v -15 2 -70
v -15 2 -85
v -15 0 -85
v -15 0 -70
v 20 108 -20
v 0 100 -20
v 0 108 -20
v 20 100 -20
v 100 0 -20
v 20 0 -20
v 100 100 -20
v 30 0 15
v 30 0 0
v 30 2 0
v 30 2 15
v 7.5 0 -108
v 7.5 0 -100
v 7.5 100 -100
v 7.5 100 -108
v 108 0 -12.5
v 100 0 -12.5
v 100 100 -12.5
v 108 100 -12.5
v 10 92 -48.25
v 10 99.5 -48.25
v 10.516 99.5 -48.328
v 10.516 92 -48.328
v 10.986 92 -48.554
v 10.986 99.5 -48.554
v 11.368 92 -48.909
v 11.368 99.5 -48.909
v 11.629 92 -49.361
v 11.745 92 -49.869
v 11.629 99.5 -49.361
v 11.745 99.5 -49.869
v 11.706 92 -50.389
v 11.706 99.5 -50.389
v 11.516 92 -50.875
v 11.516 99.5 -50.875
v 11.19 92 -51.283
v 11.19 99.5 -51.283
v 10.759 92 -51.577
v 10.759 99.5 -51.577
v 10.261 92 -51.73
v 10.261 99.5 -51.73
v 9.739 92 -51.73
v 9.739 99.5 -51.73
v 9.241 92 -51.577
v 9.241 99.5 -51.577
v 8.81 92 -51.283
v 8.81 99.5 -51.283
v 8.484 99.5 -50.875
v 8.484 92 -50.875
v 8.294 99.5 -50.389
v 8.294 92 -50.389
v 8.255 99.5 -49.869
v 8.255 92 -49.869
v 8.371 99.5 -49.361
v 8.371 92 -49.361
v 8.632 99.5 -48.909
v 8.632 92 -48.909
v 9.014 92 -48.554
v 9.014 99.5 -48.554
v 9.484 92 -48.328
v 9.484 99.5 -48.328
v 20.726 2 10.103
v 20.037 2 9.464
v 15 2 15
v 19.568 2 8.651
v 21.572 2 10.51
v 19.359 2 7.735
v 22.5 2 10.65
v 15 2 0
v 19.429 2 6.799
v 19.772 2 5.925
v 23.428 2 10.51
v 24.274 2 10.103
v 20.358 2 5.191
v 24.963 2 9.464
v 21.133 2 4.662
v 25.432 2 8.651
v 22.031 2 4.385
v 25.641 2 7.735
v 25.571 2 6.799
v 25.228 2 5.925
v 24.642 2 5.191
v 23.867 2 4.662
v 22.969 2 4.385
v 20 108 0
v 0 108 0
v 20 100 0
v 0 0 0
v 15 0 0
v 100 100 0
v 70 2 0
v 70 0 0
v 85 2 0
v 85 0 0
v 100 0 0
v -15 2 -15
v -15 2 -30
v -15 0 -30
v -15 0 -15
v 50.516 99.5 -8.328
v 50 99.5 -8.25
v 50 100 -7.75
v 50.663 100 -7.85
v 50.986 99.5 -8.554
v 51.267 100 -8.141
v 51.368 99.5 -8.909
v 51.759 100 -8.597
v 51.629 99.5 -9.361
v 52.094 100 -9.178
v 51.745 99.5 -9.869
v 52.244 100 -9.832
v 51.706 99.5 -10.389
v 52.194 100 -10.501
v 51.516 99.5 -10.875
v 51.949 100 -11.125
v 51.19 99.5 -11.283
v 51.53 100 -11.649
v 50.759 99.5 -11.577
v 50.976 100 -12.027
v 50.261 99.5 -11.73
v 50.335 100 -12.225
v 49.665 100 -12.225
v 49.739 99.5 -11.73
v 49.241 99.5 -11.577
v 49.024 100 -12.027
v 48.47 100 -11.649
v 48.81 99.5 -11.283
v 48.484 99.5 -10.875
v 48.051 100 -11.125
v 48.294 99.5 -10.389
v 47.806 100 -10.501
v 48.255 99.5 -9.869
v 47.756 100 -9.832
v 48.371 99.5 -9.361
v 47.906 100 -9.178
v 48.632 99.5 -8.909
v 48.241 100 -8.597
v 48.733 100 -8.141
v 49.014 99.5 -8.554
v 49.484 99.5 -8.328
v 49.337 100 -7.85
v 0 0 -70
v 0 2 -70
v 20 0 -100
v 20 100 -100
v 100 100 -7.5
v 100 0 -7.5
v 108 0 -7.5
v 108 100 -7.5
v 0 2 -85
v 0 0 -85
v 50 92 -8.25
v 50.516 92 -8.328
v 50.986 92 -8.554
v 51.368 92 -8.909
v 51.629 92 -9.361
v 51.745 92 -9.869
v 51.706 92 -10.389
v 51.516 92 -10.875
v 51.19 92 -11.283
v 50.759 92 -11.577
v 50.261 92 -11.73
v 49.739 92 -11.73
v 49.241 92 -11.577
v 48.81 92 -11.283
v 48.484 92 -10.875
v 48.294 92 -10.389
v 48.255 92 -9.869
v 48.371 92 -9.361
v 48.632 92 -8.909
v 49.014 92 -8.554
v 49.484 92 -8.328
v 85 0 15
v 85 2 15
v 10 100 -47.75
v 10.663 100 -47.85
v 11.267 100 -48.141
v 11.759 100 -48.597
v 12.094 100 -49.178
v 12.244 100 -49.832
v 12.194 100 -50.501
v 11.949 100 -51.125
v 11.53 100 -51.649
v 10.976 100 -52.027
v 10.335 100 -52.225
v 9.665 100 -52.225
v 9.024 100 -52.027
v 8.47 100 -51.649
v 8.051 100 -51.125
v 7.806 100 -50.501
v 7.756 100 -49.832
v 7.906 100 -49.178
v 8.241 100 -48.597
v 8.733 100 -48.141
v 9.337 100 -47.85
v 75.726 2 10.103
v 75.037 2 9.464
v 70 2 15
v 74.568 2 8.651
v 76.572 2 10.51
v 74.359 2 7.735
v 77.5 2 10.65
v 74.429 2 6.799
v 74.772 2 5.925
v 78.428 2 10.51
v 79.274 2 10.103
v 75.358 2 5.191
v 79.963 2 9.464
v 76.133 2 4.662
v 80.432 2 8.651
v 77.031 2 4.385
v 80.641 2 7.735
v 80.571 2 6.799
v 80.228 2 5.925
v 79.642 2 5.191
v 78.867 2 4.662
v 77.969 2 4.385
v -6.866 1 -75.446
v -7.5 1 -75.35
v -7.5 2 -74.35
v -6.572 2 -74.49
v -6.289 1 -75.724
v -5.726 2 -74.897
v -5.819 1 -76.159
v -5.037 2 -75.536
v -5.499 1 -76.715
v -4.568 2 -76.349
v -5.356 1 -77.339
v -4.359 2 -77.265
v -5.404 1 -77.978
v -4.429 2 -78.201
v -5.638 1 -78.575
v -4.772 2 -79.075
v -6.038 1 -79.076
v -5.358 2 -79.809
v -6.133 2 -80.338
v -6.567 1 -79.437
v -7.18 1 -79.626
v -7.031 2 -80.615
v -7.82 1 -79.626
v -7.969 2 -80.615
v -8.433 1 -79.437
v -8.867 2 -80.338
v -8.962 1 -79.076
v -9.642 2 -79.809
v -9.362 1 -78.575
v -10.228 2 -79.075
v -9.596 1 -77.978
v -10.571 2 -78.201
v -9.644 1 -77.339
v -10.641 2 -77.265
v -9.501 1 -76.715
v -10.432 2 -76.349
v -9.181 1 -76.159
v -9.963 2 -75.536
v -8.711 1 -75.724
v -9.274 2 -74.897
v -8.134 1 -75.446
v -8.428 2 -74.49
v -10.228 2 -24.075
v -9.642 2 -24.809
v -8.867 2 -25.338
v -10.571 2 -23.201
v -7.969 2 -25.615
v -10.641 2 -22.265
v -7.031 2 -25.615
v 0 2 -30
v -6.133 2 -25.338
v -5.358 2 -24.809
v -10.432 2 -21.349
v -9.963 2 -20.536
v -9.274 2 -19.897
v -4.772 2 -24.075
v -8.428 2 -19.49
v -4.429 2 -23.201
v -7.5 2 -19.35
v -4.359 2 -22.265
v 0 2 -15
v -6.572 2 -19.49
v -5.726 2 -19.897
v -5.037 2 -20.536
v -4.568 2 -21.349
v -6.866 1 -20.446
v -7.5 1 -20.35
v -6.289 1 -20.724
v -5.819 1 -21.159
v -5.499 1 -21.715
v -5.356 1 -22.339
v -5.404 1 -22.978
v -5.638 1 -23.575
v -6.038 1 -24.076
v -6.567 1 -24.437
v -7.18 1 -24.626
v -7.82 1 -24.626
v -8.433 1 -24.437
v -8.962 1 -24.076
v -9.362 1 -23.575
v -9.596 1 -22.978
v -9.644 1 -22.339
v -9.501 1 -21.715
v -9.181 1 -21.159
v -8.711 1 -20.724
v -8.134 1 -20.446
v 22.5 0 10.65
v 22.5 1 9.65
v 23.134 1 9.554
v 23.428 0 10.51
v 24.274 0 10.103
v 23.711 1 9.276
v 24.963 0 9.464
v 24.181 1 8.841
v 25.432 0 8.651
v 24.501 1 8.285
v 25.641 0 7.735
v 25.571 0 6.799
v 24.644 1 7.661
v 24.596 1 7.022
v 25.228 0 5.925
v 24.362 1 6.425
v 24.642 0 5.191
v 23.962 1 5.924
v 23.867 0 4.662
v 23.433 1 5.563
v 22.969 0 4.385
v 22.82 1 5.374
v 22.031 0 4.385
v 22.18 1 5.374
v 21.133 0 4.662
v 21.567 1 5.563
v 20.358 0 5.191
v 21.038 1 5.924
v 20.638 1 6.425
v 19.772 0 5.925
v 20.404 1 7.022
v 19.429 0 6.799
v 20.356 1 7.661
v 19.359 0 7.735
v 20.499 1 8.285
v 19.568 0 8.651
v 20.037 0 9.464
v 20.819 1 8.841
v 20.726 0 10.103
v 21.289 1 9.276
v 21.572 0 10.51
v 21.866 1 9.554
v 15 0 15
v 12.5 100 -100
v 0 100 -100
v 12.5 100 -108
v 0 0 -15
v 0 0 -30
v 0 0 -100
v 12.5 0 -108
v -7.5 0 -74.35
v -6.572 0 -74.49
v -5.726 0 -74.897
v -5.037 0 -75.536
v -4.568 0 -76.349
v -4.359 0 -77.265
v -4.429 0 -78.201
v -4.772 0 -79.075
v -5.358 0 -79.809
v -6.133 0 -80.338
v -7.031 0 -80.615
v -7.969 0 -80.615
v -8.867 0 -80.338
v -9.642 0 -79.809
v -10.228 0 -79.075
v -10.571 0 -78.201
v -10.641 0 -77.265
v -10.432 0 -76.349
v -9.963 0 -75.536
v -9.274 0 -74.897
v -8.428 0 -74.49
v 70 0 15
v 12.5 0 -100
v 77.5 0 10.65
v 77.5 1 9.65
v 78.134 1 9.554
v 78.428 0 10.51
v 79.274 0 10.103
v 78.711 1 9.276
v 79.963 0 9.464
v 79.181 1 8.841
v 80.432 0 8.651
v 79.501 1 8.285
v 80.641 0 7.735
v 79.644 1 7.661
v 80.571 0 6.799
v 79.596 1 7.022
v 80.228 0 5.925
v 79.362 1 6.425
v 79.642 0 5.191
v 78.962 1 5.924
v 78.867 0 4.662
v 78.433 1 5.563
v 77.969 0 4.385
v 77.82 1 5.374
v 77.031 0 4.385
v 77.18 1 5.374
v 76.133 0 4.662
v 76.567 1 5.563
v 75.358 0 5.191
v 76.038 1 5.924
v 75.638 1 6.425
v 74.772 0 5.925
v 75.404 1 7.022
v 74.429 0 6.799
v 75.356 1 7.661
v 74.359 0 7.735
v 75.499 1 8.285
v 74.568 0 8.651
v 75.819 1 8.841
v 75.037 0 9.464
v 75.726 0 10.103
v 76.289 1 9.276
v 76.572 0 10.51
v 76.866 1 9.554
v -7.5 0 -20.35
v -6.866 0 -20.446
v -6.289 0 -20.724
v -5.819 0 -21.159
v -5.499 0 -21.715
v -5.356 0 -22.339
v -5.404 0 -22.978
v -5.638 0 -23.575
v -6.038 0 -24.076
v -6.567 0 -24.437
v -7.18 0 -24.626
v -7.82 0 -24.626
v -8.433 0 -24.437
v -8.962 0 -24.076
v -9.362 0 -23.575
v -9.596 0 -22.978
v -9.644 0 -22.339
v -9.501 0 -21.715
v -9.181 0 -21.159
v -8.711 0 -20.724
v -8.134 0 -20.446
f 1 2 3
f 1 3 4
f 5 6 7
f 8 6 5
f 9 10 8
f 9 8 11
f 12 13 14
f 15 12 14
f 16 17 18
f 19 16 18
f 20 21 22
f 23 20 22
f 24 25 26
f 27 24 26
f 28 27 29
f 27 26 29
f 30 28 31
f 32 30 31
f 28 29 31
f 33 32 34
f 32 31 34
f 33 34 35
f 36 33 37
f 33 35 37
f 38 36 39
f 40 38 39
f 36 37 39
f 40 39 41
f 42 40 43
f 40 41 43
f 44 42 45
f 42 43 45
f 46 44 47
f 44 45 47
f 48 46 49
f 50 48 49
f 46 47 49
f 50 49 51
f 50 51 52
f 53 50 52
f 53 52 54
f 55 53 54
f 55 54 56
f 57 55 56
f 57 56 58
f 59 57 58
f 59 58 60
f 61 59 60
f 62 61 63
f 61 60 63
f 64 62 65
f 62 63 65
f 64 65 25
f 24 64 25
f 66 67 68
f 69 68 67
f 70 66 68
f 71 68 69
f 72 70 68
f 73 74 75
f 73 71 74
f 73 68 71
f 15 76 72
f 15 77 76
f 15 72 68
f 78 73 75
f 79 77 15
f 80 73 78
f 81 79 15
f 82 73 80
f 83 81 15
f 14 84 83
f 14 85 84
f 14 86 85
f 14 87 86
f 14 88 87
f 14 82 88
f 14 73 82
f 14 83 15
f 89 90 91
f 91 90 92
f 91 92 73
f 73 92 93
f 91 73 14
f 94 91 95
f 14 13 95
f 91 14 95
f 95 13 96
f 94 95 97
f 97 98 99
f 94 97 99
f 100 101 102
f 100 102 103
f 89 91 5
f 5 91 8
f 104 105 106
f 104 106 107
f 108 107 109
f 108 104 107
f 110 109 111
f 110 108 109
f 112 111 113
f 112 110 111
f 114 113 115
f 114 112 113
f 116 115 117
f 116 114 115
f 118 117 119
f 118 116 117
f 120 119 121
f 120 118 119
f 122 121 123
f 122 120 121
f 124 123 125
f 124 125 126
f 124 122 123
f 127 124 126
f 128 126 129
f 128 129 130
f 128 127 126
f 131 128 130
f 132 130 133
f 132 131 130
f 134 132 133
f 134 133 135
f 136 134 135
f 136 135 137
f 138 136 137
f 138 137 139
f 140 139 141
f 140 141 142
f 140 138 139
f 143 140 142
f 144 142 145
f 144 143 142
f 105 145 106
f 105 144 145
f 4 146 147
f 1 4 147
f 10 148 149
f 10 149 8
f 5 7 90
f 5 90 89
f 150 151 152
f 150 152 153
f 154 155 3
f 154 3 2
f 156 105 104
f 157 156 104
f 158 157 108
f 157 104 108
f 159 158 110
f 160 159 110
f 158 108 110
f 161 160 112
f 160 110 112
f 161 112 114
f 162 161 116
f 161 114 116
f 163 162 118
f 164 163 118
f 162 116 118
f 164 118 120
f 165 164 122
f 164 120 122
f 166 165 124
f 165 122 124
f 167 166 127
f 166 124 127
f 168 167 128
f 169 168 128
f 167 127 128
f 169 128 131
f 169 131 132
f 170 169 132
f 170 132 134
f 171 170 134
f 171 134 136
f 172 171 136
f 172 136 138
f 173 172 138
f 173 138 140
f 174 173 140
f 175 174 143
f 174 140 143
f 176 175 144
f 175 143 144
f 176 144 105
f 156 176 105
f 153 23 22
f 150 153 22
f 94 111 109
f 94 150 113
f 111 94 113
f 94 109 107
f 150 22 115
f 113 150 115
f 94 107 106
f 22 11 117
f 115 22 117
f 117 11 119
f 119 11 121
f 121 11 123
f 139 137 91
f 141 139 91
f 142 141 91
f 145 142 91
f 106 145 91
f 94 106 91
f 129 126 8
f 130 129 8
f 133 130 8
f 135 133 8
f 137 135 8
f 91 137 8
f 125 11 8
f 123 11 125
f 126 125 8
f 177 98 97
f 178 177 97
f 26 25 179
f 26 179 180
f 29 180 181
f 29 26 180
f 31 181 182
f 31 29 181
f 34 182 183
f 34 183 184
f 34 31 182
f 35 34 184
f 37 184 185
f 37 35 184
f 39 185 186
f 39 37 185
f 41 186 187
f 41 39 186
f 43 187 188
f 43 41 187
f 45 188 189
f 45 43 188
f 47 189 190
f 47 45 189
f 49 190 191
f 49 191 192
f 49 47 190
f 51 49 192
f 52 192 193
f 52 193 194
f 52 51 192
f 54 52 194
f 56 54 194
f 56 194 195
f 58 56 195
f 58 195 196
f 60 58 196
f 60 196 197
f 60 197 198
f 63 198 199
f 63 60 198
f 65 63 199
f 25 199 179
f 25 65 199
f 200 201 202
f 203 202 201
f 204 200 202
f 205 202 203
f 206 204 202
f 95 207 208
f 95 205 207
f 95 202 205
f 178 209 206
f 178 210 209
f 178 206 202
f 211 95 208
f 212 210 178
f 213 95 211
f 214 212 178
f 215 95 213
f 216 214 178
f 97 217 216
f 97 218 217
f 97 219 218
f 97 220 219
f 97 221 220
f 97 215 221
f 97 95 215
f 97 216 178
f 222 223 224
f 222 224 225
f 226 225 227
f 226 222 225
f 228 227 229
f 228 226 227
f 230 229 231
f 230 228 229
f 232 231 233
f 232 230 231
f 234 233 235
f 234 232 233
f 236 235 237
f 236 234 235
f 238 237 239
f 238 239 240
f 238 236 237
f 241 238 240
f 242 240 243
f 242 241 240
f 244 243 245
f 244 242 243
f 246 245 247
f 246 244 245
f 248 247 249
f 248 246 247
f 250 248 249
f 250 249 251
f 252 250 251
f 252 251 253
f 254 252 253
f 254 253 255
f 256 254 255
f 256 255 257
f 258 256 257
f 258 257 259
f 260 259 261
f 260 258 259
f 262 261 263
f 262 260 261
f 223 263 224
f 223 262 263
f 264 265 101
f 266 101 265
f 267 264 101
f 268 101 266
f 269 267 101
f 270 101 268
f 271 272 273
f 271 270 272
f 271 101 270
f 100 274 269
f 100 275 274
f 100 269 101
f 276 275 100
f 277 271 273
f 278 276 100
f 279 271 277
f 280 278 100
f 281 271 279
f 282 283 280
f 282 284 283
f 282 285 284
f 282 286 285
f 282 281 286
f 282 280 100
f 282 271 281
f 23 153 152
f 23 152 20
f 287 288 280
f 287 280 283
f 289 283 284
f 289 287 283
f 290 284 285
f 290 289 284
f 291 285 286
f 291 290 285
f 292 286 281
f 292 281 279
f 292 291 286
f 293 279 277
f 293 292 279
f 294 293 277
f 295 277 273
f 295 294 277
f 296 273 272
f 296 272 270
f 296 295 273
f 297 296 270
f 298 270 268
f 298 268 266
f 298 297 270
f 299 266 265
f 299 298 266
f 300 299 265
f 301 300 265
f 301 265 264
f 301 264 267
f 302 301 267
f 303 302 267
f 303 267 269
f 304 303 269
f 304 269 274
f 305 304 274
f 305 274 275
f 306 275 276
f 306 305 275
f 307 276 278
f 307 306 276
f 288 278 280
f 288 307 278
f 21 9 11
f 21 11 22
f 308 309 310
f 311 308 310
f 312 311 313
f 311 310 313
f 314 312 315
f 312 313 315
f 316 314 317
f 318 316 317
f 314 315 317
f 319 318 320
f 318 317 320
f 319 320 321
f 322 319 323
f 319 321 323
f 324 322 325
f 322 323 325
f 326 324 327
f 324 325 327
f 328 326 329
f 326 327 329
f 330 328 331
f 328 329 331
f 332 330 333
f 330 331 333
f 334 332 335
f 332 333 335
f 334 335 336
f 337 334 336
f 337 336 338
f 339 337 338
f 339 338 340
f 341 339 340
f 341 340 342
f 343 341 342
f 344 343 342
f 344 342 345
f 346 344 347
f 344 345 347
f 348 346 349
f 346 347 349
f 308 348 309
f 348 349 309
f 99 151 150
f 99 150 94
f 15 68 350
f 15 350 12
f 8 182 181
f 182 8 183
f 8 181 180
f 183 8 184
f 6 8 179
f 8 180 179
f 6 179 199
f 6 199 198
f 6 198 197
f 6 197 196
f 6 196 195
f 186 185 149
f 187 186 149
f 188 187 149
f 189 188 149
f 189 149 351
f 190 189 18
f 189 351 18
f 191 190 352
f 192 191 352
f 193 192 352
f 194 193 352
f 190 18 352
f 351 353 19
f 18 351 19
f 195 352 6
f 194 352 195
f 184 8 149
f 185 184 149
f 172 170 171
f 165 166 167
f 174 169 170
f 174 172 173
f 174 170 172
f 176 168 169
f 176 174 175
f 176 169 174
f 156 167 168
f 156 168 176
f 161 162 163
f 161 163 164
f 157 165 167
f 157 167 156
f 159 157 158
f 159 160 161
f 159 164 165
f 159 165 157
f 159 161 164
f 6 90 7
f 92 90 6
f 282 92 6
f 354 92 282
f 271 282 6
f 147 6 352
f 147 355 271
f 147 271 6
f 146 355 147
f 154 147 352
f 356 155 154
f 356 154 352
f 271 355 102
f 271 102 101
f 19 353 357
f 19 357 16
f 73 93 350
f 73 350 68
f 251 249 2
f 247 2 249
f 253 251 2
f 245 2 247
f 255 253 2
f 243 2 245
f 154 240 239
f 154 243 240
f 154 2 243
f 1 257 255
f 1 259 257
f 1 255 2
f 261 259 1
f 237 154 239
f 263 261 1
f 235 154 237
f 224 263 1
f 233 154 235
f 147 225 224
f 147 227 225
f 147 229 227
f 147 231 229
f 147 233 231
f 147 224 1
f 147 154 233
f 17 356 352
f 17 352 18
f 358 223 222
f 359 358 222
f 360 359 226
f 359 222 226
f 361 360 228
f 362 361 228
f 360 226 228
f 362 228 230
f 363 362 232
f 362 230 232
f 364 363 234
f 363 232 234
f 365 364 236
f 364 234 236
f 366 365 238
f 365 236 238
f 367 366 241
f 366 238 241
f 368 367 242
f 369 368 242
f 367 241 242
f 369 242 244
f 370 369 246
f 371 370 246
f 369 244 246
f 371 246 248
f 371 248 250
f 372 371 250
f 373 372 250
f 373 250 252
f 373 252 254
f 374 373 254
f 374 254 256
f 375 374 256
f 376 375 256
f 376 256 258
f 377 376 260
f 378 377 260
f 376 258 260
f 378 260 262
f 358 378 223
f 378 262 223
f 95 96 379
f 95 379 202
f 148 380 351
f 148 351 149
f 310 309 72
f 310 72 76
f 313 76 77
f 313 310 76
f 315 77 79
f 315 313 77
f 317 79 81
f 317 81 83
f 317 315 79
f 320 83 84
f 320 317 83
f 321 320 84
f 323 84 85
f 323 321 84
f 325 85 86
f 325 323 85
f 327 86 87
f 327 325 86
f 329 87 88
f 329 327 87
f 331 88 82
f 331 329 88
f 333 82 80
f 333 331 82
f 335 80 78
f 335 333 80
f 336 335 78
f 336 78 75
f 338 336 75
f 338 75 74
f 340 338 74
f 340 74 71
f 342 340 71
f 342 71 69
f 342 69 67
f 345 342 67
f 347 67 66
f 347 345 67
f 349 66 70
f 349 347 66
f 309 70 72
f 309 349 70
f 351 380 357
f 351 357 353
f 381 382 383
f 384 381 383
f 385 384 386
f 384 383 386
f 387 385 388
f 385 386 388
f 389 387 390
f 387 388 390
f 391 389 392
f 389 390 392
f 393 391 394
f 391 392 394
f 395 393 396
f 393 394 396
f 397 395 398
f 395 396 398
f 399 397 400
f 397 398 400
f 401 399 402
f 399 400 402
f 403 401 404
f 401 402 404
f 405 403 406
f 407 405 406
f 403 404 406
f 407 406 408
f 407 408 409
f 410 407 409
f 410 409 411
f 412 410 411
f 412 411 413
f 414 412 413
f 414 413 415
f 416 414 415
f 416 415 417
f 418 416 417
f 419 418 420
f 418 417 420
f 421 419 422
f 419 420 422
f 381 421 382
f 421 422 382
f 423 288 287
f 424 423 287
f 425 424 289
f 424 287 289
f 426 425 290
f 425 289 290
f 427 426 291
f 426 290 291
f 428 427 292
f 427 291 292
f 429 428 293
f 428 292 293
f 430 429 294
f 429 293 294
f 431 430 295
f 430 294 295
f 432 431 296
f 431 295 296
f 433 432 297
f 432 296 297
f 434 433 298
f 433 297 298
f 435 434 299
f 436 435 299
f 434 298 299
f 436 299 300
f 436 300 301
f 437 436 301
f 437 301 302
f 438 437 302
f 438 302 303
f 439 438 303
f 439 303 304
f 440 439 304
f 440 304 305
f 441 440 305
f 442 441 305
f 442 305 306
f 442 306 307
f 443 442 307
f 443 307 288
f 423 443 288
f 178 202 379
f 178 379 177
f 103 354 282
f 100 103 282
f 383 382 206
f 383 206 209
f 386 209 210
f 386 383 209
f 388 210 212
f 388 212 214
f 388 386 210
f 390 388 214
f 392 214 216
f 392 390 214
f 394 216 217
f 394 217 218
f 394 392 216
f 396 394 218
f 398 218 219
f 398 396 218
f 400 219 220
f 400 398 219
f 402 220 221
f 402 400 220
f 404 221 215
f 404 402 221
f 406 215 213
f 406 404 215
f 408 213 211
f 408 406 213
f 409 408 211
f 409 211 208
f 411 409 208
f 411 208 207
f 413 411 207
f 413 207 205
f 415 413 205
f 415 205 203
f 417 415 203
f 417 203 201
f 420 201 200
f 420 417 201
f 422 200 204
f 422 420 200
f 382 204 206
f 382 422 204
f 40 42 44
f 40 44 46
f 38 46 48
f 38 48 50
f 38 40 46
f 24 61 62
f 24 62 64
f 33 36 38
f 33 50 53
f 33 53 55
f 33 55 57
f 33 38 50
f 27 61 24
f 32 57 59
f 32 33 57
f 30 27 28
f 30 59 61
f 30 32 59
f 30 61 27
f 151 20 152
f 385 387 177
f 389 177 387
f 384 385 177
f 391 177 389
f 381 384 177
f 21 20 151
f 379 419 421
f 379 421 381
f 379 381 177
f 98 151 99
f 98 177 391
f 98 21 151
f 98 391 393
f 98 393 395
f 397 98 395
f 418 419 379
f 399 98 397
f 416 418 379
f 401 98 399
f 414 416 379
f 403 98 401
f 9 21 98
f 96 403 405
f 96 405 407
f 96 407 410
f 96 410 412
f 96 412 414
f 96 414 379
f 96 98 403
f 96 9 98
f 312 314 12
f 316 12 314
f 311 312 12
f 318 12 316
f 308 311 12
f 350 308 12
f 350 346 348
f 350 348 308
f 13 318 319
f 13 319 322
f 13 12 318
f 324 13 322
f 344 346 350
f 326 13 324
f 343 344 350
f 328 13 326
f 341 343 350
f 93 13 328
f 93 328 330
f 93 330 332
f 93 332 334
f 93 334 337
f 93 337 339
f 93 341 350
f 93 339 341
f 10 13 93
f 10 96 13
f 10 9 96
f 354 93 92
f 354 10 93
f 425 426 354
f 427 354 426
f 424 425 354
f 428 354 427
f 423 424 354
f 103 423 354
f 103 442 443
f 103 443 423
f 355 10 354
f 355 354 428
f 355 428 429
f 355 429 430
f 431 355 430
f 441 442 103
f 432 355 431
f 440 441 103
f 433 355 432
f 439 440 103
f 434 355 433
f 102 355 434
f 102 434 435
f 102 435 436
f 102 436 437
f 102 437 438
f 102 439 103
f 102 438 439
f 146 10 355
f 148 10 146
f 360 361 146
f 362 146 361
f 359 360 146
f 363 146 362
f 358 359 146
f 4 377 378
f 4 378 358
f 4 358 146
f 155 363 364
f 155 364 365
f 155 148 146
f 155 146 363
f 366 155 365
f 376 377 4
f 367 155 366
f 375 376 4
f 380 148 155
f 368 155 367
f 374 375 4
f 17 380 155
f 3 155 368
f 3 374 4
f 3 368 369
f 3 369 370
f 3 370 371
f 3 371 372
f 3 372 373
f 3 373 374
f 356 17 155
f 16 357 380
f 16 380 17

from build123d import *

# Parameters (mm, degrees)
BOSS_EXTRUDE1_DEPTH = 100
SKETCH3_W           = 20
SKETCH3_H           = 20
BOSS_EXTRUDE2_DEPTH = 8
SKETCH4_W           = 5
SKETCH4_H           = 100
BOSS_EXTRUDE3_DEPTH = 8
SKETCH5_W           = 5
SKETCH5_H           = 100
BOSS_EXTRUDE4_DEPTH = 8
SKETCH6_R           = 1.75
CUT_EXTRUDE1_DEPTH  = 8
CHAMFER1_SIZE       = 0.5
SKETCH7_W           = 15
SKETCH7_H           = 2
BOSS_EXTRUDE5_DEPTH = 15
SKETCH8_W           = 15
SKETCH8_H           = 2
BOSS_EXTRUDE6_DEPTH = 15
SKETCH9_R           = 2.15
CUT_EXTRUDE2_DEPTH  = 15
CHAMFER2_SIZE       = 1


with BuildPart() as part:
    # Sketch2 → Boss-Extrude1 (new body)
    with BuildSketch(Plane(origin=(0, 0, 0), x_dir=(1, 0, 0), z_dir=(0, 1, 0))):
        Polygon((0, 0), (0, 100), (20, 100), (20, 20), (100, 20), (100, 0), align=None)
    extrude(amount=BOSS_EXTRUDE1_DEPTH)

    # Sketch3 → Boss-Extrude2 (add)
    with BuildSketch(Plane(origin=(0, 100, 0), x_dir=(1, 0, 0), z_dir=(0, 1, 0))):
        with Locations((10, 10)):
            Rectangle(SKETCH3_W, SKETCH3_H)
    extrude(amount=BOSS_EXTRUDE2_DEPTH)

    # Sketch4 → Boss-Extrude3 (add)
    with BuildSketch(Plane(origin=(100, 0, 0), x_dir=(0, 0, -1), z_dir=(1, 0, 0))):
        with Locations((10, 50)):
            Rectangle(SKETCH4_W, SKETCH4_H)
    extrude(amount=BOSS_EXTRUDE3_DEPTH)

    # Sketch5 → Boss-Extrude4 (add)
    with BuildSketch(Plane(origin=(0, 0, -100), x_dir=(-1, 0, 0), z_dir=(0, 0, -1))):
        with Locations((-10, 50)):
            Rectangle(SKETCH5_W, SKETCH5_H)
    extrude(amount=BOSS_EXTRUDE4_DEPTH)

    # Sketch6 → Cut-Extrude1 (cut)
    with BuildSketch(Plane(origin=(0, 100, 0), x_dir=(1, 0, 0), z_dir=(0, 1, 0))):
        with Locations(Location((50, 10, 0), (0, 0, 270))):
            Circle(SKETCH6_R)
        with Locations(Location((10, 50, 0), (0, 0, 270))):
            Circle(SKETCH6_R)
    extrude(amount=-CUT_EXTRUDE1_DEPTH, mode=Mode.SUBTRACT)

    # Chamfer1
    chamfer1_edges = [part.edges().sort_by_distance(p)[0] for p in [
        (50, 100, -11.75),
        (10, 100, -51.75),
    ]]
    chamfer(chamfer1_edges, length=CHAMFER1_SIZE)

    # Sketch7 → Boss-Extrude5 (add)
    with BuildSketch(Plane.XY):
        with Locations((22.5, 1)):
            Rectangle(SKETCH7_W, SKETCH7_H)
        with Locations((77.5, 1)):
            Rectangle(SKETCH7_W, SKETCH7_H)
    extrude(amount=BOSS_EXTRUDE5_DEPTH)

    # Sketch8 → Boss-Extrude6 (add)
    with BuildSketch(Plane.ZY):
        with Locations((-77.5, 1)):
            Rectangle(SKETCH8_W, SKETCH8_H)
        with Locations((-22.5, 1)):
            Rectangle(SKETCH8_W, SKETCH8_H)
    extrude(amount=BOSS_EXTRUDE6_DEPTH)

    # Sketch9 → Cut-Extrude2 (cut)
    with BuildSketch(Plane(origin=(0, 2, 0), x_dir=(1, 0, 0), z_dir=(0, 1, 0))):
        with Locations(Location((-7.5, 77.5, 0), (0, 0, 270))):
            Circle(SKETCH9_R)
        with Locations(Location((-7.5, 22.5, 0), (0, 0, 270))):
            Circle(SKETCH9_R)
        with Locations(Location((22.5, -7.5, 0), (0, 0, 270))):
            Circle(SKETCH9_R)
        with Locations(Location((77.5, -7.5, 0), (0, 0, 270))):
            Circle(SKETCH9_R)
    extrude(amount=-CUT_EXTRUDE2_DEPTH, mode=Mode.SUBTRACT)

    # Chamfer2
    chamfer2_edges = [part.edges().sort_by_distance(p)[0] for p in [
        (-7.5, 0, -79.65),
        (-7.5, 2, -79.65),
        (-7.5, 2, -24.65),
        (22.5, 0, 5.35),
        (22.5, 2, 5.35),
        (77.5, 0, 5.35),
        (77.5, 2, 5.35),
    ]]
    chamfer(chamfer2_edges, length=CHAMFER2_SIZE - 0.0001)  # a hair under: the kernel refuses the full size


solid = part.part
